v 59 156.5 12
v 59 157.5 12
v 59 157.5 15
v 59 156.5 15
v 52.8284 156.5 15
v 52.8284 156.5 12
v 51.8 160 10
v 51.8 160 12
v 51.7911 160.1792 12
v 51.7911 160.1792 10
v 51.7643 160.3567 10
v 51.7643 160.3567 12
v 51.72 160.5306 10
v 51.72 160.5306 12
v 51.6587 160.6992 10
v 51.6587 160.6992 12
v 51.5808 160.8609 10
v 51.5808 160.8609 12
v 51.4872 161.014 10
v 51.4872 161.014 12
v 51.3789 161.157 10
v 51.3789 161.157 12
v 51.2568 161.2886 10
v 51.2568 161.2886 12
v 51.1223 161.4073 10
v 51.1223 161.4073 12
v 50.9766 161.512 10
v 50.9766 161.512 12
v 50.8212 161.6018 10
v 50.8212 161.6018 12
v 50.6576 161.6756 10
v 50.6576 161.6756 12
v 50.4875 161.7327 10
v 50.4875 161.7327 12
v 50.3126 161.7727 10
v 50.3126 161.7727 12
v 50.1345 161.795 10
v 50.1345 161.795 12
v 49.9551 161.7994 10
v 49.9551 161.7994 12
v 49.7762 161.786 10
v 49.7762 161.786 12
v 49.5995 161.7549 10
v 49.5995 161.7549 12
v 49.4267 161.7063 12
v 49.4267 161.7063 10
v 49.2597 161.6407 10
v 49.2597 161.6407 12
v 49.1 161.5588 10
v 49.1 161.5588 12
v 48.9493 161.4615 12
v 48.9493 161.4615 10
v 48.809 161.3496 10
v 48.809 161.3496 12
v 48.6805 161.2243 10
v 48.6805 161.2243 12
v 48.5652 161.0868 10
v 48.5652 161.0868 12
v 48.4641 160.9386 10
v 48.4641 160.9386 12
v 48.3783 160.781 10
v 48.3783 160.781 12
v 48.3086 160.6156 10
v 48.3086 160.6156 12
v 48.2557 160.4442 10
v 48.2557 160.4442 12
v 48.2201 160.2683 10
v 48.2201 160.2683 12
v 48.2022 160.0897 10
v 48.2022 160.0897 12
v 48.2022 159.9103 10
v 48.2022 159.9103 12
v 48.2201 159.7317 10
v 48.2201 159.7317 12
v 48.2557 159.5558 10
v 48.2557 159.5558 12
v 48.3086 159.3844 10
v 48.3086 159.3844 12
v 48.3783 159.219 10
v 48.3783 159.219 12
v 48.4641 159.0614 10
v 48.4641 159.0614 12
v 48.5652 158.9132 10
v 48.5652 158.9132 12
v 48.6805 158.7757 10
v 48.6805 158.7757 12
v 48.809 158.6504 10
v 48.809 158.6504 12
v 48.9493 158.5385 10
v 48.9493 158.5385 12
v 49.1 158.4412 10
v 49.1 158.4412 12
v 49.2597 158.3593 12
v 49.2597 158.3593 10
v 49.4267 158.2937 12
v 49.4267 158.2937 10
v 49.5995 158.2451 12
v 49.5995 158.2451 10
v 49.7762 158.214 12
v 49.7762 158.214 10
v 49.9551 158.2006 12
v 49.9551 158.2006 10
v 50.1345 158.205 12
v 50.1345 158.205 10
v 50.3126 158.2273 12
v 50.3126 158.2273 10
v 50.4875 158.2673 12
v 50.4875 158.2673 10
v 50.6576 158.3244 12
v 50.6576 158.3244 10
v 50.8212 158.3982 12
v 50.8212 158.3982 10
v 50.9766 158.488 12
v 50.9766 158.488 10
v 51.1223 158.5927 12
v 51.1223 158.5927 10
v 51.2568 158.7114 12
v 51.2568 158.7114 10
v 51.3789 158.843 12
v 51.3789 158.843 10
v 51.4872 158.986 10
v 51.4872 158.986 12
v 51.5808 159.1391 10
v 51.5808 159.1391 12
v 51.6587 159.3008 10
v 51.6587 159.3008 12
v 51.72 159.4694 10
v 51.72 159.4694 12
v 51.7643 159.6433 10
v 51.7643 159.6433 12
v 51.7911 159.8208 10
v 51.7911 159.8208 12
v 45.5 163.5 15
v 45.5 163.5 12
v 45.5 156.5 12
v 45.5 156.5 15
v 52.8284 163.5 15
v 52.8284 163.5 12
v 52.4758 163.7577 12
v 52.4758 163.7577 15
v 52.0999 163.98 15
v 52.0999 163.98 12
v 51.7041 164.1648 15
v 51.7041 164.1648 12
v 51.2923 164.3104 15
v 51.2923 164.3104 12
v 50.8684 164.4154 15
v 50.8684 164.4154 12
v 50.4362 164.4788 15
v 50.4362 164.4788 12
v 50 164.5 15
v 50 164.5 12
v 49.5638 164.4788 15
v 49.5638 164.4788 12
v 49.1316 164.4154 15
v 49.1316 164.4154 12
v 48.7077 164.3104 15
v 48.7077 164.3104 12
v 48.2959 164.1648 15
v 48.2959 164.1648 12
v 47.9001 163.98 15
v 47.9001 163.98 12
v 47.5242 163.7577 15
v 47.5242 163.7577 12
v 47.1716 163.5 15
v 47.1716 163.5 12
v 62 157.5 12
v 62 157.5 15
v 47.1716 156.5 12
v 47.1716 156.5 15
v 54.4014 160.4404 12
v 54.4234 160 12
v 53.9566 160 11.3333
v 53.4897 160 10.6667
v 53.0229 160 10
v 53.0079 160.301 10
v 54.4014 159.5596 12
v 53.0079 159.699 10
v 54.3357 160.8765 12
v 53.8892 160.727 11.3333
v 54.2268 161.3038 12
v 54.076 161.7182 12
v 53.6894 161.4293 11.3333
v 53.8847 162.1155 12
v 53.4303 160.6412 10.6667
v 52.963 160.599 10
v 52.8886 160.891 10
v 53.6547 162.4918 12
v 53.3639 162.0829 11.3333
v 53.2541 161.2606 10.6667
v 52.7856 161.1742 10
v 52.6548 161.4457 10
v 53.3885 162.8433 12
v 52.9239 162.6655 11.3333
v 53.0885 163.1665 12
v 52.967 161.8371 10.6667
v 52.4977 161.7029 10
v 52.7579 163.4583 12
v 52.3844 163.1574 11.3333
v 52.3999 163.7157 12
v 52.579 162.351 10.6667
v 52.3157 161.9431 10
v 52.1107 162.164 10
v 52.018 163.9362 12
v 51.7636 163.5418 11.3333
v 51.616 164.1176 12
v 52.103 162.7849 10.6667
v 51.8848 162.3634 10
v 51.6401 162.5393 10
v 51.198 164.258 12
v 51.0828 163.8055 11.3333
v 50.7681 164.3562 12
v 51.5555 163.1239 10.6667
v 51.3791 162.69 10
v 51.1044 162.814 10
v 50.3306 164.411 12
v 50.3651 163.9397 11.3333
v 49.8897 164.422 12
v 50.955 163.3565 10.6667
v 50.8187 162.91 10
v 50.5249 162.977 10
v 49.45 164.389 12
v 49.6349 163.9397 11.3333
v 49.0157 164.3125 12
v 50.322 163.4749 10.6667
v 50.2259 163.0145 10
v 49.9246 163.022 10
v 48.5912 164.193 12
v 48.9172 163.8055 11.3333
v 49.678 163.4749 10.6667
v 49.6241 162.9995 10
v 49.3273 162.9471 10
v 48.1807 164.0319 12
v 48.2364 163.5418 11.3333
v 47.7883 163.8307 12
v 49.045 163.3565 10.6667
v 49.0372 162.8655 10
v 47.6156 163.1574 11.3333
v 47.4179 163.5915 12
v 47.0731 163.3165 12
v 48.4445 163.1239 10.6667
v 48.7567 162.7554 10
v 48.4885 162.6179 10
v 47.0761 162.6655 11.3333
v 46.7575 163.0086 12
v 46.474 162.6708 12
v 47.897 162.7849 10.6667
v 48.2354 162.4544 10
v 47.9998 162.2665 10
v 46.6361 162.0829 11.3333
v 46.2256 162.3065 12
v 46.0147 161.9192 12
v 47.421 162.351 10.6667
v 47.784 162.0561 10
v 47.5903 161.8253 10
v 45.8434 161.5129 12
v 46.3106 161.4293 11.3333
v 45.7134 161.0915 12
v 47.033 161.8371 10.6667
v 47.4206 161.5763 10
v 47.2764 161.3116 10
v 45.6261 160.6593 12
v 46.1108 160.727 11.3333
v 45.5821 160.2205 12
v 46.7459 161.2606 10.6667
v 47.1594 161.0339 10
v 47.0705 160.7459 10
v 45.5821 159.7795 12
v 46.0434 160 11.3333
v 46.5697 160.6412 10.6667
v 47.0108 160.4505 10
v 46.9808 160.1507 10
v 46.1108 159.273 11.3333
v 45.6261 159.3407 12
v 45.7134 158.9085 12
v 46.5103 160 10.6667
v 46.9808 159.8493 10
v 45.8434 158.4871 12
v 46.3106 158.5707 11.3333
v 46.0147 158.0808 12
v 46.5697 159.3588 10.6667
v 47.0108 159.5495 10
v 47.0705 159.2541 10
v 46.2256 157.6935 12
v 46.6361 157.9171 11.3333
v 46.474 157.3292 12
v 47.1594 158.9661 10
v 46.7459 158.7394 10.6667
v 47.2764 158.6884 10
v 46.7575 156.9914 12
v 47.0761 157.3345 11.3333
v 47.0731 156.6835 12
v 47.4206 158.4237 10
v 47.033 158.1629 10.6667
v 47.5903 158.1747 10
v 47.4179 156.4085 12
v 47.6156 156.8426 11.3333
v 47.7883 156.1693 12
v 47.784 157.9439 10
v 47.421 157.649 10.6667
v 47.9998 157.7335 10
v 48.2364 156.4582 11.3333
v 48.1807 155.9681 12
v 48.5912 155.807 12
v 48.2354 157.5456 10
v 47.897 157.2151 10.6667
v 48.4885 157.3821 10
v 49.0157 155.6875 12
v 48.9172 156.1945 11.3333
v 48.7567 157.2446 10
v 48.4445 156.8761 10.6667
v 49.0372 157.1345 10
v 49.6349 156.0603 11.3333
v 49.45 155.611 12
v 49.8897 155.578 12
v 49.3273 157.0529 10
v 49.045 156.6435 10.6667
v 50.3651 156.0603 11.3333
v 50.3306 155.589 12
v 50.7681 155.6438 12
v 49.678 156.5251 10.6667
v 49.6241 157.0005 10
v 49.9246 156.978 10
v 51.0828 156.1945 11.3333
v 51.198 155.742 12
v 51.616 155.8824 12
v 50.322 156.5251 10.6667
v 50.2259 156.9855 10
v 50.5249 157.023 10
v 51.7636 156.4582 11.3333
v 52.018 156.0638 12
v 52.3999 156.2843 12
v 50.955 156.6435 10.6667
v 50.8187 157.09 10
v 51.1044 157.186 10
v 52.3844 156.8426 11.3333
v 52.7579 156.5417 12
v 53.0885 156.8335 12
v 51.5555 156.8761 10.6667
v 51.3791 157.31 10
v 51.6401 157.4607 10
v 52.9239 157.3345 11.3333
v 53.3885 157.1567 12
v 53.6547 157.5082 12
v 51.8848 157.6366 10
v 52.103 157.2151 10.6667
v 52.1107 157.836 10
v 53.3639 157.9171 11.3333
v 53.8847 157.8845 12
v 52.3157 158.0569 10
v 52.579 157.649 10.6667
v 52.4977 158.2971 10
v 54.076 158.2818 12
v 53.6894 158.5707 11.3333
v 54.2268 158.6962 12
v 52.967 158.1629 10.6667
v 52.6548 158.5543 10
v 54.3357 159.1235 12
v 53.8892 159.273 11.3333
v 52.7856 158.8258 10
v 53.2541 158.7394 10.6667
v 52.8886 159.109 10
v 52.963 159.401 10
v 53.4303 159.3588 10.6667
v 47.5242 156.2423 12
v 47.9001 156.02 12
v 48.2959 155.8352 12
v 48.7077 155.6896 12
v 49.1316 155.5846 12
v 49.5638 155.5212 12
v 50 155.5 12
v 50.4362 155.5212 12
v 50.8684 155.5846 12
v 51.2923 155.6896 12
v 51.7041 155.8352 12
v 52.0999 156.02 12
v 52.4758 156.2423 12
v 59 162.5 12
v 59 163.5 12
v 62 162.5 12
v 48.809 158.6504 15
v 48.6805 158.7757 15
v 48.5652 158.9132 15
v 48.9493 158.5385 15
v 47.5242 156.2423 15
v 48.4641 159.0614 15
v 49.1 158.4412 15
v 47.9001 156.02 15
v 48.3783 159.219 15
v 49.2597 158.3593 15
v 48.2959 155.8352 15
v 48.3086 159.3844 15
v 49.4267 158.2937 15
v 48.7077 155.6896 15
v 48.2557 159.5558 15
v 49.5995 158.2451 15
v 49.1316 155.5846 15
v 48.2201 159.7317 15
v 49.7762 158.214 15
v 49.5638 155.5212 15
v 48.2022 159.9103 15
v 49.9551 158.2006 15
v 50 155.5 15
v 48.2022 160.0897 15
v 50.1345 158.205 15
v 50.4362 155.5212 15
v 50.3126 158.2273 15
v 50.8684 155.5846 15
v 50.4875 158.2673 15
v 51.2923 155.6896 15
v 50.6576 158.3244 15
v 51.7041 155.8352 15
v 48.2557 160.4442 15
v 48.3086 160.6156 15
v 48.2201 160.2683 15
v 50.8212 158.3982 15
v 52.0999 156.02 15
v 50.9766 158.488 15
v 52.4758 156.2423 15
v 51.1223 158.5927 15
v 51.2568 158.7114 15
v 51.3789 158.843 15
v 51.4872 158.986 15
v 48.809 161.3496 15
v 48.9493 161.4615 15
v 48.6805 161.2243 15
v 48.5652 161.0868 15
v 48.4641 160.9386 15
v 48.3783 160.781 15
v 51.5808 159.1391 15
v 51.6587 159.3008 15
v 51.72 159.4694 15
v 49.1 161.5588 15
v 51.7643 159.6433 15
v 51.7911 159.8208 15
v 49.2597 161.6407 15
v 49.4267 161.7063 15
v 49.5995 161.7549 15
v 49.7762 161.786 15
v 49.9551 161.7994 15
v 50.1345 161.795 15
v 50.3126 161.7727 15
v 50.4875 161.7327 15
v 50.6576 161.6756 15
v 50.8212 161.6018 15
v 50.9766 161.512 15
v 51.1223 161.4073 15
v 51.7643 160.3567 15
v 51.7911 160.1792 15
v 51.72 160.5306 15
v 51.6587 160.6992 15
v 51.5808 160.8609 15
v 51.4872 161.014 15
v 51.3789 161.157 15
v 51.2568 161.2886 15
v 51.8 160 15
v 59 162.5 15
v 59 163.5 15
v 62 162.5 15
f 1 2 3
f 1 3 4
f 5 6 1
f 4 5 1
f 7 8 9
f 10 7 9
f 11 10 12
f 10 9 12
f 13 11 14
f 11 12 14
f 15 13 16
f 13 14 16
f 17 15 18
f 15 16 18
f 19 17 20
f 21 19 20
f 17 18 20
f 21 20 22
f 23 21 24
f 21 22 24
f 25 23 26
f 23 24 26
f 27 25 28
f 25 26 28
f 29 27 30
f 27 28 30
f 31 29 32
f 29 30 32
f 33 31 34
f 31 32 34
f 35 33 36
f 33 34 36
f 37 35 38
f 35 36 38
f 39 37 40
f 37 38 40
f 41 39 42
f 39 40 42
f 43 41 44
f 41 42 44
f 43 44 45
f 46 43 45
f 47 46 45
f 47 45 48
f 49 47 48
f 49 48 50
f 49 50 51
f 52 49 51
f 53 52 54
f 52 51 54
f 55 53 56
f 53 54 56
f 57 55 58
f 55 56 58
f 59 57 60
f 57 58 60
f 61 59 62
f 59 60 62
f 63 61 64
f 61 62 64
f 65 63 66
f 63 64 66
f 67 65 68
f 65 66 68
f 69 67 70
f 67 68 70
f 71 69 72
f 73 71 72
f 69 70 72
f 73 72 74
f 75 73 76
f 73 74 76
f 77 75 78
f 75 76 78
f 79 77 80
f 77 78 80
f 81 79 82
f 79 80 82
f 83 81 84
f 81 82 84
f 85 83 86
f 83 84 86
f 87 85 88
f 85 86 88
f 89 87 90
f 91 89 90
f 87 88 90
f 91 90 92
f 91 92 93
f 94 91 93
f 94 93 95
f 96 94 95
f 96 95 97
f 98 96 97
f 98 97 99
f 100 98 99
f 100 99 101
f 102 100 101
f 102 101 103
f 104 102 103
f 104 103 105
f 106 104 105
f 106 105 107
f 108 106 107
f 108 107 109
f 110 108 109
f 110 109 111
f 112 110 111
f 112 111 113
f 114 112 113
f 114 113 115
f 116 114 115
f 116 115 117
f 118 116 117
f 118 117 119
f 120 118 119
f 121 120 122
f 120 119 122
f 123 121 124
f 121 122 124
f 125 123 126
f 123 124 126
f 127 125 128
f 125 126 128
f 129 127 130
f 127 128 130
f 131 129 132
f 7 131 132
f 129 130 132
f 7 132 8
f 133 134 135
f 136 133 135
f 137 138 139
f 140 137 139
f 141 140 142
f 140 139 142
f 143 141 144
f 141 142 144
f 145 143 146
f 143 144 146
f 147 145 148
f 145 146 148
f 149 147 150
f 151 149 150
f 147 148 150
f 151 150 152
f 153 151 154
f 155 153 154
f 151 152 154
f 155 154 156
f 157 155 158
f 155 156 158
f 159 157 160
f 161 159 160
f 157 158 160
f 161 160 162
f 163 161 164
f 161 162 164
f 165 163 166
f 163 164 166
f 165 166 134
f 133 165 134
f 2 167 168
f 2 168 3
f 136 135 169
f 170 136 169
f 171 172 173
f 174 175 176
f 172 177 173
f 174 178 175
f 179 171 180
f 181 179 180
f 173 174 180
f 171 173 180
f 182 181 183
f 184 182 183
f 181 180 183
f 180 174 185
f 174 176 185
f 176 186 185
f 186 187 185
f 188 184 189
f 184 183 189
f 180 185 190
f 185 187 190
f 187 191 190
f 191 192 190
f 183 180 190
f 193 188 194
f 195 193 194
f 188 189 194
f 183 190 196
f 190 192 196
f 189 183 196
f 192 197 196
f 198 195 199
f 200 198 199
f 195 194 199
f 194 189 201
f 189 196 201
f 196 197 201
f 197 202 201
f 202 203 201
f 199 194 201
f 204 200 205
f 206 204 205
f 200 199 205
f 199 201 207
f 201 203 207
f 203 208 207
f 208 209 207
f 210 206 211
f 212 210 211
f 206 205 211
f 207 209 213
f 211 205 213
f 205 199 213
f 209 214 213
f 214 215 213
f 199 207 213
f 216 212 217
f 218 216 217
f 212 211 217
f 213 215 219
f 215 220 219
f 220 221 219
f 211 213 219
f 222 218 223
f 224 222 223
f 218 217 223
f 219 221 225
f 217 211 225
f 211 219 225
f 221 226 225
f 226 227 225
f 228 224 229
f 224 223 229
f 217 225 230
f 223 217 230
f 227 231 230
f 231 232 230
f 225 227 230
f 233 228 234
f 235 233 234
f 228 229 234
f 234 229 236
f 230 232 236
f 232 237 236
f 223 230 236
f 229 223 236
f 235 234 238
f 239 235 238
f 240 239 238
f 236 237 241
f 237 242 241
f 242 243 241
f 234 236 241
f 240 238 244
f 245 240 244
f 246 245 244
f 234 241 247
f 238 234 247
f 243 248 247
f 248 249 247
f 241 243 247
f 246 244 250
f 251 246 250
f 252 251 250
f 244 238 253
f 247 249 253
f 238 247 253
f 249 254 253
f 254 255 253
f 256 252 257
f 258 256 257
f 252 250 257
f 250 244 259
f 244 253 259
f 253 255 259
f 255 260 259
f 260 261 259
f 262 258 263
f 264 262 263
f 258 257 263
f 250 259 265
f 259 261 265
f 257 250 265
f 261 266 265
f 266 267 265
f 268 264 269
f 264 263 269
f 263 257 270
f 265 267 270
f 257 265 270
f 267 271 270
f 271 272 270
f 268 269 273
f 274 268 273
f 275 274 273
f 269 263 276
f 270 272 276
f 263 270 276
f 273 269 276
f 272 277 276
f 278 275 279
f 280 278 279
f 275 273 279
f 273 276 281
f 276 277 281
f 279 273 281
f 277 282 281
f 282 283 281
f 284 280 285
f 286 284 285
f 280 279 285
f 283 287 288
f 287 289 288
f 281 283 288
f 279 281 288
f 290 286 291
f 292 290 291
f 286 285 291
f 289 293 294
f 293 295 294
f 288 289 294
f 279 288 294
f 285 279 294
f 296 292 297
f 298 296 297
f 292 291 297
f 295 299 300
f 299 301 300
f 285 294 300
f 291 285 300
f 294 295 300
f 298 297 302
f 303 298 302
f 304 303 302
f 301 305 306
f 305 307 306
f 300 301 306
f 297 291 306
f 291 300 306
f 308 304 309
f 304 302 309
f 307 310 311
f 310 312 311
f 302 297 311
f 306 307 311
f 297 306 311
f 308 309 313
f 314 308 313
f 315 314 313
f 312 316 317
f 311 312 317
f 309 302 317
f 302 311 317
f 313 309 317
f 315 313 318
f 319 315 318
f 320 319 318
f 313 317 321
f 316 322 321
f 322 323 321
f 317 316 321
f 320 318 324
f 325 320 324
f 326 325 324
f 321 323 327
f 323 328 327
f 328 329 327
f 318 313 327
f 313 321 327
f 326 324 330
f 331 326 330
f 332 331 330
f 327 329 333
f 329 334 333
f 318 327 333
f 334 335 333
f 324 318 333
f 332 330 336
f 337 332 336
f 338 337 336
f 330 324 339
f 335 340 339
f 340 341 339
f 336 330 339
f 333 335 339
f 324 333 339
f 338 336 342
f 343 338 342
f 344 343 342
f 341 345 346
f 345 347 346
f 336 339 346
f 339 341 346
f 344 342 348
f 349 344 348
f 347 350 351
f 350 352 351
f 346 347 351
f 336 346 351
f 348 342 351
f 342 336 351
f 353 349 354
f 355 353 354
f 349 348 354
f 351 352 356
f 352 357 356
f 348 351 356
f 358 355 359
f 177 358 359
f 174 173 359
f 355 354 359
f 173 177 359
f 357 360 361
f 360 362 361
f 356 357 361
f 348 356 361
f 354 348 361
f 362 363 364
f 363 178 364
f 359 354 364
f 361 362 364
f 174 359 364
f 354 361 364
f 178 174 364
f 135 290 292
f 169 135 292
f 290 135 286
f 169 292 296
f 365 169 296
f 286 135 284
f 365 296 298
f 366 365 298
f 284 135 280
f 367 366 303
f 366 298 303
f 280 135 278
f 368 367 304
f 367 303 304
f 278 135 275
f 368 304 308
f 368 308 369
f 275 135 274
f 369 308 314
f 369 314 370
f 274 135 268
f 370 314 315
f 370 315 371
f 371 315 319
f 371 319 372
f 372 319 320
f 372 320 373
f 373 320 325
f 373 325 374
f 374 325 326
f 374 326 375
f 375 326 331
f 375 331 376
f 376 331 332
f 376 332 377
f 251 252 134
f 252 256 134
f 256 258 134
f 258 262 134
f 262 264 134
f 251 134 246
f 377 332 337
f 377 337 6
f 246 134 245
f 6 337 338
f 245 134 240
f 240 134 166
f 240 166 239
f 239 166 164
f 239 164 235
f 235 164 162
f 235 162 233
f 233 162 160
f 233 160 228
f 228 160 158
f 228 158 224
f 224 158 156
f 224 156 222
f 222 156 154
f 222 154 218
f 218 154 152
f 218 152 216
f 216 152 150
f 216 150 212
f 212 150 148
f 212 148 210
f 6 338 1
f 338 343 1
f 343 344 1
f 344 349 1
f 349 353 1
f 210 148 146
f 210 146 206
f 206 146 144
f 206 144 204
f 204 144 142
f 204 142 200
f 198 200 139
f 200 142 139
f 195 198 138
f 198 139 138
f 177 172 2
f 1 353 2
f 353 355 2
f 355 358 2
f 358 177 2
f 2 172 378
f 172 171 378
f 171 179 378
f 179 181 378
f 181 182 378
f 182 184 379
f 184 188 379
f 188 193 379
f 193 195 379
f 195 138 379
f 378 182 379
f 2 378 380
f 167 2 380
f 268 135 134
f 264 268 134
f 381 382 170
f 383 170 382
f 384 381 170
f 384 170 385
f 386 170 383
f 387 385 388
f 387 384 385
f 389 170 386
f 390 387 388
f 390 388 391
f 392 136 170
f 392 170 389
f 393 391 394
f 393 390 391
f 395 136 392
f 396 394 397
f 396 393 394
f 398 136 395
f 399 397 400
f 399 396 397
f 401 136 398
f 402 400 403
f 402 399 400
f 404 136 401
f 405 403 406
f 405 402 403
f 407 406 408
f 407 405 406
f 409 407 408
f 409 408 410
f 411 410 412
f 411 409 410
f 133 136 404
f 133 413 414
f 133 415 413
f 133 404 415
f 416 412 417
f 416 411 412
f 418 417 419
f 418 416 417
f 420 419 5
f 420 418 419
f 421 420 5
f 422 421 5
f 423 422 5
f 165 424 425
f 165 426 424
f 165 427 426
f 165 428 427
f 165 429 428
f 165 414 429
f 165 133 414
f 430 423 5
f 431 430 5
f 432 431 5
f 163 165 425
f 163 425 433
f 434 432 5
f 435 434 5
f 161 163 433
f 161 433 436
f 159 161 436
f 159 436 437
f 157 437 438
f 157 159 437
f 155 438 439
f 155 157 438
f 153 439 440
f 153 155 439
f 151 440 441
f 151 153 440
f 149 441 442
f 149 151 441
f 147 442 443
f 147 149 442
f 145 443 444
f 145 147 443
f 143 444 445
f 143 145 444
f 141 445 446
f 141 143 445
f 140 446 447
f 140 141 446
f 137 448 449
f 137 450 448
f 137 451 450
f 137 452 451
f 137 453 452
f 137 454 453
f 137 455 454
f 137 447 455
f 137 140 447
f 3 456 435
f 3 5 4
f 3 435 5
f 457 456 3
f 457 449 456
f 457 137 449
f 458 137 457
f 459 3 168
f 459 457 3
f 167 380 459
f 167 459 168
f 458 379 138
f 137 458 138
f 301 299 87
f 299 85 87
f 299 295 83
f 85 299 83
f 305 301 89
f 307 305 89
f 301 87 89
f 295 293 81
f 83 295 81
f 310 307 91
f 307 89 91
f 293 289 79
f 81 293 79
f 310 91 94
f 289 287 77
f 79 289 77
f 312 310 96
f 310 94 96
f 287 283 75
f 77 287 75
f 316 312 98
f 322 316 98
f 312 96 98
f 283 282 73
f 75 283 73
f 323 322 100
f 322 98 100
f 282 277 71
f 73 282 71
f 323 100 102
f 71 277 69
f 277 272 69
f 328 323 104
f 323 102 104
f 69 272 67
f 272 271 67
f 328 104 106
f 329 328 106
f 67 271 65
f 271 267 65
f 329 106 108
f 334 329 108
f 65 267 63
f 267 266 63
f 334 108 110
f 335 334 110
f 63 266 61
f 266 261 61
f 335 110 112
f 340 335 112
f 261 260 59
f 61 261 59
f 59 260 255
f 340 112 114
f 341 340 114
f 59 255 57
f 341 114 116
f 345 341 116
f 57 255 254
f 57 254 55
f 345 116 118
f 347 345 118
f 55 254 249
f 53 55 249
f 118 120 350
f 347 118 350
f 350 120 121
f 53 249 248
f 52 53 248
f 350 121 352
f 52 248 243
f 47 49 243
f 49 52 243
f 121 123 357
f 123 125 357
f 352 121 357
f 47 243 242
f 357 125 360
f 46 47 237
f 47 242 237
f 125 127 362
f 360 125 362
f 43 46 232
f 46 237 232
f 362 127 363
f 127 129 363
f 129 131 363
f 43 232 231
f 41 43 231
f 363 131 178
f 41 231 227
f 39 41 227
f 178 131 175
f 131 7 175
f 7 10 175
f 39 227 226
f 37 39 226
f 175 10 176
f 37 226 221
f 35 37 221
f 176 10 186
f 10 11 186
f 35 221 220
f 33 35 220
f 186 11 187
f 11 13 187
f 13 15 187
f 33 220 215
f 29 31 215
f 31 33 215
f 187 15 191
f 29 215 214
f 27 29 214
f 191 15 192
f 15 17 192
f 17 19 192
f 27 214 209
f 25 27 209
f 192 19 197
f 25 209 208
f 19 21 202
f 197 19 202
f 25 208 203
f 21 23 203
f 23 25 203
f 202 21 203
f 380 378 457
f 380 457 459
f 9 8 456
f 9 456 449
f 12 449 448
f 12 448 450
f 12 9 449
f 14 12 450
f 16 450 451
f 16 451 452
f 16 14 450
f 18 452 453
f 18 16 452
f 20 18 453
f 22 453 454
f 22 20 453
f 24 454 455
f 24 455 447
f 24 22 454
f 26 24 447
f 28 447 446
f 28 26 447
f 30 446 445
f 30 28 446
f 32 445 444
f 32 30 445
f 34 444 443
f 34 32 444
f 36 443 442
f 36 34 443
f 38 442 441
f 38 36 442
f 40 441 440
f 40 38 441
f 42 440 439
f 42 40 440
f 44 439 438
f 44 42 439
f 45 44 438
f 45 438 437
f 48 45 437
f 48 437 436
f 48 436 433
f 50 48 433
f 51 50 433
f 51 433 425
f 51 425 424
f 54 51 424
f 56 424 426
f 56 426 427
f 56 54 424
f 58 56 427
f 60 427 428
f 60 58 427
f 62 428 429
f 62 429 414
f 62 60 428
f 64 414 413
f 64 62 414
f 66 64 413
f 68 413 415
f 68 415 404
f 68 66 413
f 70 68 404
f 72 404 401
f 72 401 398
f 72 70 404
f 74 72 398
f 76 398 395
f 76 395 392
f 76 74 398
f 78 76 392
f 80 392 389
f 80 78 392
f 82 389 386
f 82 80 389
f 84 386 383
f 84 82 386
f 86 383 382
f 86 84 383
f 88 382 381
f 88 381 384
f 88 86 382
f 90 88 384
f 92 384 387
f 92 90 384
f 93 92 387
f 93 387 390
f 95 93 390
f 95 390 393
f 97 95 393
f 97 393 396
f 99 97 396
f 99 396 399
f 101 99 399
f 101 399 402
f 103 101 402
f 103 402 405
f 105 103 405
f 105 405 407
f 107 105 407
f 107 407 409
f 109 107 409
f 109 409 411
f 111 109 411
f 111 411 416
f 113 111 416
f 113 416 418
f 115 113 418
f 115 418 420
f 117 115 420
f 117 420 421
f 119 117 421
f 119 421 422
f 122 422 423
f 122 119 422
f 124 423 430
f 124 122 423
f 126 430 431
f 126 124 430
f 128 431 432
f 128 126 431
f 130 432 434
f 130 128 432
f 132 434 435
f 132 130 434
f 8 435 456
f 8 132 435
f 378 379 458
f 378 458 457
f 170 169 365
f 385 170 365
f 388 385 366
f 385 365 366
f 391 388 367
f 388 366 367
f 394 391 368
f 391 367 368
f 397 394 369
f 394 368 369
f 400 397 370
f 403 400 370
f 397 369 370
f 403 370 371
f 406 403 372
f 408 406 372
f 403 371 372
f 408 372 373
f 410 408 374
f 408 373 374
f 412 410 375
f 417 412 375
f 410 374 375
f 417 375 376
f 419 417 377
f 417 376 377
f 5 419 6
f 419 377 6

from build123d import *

# Parameters (mm, degrees)
SKETCH164_R     = 1.8
PAD127002_DEPTH = 3


with BuildPart() as innerbearingrace:
    # Sketch165 → Revolution008 (revolve)
    with BuildSketch(Plane(origin=(50, 160, 10), x_dir=(1, 0, 0), z_dir=(0, -1, 0))):
        Polygon((4.423355, 2), (3.02294, 0), (1.8, 0), (1.8, 2), align=None)
    revolve(axis=Axis((50, 160, 10), (0, 0, 1)))


with BuildPart() as steeringcolumn_short:
    # Sketch164 → Pad127002 (new body)
    with BuildSketch(Plane(origin=(50, 160, 12), x_dir=(1, 0, 0), z_dir=(0, 0, 1))):
        with BuildLine():
            Line((9, 3.5), (2.828427, 3.5))
            ThreePointArc((2.828427, 3.5), (0, 4.5), (-2.828427, 3.5))
            Line((-2.828427, 3.5), (-4.5, 3.5))
            Line((-4.5, 3.5), (-4.5, -3.5))
            Line((-4.5, -3.5), (-2.828427, -3.5))
            ThreePointArc((-2.828427, -3.5), (0, -4.5), (2.828427, -3.5))
            Line((2.828427, -3.5), (9, -3.5))
            Line((9, -2.5), (9, -3.5))
            Line((12, -2.5), (9, -2.5))
            Line((12, 2.5), (12, -2.5))
            Line((9, 2.5), (12, 2.5))
            Line((9, 3.5), (9, 2.5))
        make_face()
        Circle(SKETCH164_R, mode=Mode.SUBTRACT)
    extrude(amount=PAD127002_DEPTH)

    # Fusion004020021: union InnerBearingRace
    add(innerbearingrace.part)


solid = steeringcolumn_short.part
